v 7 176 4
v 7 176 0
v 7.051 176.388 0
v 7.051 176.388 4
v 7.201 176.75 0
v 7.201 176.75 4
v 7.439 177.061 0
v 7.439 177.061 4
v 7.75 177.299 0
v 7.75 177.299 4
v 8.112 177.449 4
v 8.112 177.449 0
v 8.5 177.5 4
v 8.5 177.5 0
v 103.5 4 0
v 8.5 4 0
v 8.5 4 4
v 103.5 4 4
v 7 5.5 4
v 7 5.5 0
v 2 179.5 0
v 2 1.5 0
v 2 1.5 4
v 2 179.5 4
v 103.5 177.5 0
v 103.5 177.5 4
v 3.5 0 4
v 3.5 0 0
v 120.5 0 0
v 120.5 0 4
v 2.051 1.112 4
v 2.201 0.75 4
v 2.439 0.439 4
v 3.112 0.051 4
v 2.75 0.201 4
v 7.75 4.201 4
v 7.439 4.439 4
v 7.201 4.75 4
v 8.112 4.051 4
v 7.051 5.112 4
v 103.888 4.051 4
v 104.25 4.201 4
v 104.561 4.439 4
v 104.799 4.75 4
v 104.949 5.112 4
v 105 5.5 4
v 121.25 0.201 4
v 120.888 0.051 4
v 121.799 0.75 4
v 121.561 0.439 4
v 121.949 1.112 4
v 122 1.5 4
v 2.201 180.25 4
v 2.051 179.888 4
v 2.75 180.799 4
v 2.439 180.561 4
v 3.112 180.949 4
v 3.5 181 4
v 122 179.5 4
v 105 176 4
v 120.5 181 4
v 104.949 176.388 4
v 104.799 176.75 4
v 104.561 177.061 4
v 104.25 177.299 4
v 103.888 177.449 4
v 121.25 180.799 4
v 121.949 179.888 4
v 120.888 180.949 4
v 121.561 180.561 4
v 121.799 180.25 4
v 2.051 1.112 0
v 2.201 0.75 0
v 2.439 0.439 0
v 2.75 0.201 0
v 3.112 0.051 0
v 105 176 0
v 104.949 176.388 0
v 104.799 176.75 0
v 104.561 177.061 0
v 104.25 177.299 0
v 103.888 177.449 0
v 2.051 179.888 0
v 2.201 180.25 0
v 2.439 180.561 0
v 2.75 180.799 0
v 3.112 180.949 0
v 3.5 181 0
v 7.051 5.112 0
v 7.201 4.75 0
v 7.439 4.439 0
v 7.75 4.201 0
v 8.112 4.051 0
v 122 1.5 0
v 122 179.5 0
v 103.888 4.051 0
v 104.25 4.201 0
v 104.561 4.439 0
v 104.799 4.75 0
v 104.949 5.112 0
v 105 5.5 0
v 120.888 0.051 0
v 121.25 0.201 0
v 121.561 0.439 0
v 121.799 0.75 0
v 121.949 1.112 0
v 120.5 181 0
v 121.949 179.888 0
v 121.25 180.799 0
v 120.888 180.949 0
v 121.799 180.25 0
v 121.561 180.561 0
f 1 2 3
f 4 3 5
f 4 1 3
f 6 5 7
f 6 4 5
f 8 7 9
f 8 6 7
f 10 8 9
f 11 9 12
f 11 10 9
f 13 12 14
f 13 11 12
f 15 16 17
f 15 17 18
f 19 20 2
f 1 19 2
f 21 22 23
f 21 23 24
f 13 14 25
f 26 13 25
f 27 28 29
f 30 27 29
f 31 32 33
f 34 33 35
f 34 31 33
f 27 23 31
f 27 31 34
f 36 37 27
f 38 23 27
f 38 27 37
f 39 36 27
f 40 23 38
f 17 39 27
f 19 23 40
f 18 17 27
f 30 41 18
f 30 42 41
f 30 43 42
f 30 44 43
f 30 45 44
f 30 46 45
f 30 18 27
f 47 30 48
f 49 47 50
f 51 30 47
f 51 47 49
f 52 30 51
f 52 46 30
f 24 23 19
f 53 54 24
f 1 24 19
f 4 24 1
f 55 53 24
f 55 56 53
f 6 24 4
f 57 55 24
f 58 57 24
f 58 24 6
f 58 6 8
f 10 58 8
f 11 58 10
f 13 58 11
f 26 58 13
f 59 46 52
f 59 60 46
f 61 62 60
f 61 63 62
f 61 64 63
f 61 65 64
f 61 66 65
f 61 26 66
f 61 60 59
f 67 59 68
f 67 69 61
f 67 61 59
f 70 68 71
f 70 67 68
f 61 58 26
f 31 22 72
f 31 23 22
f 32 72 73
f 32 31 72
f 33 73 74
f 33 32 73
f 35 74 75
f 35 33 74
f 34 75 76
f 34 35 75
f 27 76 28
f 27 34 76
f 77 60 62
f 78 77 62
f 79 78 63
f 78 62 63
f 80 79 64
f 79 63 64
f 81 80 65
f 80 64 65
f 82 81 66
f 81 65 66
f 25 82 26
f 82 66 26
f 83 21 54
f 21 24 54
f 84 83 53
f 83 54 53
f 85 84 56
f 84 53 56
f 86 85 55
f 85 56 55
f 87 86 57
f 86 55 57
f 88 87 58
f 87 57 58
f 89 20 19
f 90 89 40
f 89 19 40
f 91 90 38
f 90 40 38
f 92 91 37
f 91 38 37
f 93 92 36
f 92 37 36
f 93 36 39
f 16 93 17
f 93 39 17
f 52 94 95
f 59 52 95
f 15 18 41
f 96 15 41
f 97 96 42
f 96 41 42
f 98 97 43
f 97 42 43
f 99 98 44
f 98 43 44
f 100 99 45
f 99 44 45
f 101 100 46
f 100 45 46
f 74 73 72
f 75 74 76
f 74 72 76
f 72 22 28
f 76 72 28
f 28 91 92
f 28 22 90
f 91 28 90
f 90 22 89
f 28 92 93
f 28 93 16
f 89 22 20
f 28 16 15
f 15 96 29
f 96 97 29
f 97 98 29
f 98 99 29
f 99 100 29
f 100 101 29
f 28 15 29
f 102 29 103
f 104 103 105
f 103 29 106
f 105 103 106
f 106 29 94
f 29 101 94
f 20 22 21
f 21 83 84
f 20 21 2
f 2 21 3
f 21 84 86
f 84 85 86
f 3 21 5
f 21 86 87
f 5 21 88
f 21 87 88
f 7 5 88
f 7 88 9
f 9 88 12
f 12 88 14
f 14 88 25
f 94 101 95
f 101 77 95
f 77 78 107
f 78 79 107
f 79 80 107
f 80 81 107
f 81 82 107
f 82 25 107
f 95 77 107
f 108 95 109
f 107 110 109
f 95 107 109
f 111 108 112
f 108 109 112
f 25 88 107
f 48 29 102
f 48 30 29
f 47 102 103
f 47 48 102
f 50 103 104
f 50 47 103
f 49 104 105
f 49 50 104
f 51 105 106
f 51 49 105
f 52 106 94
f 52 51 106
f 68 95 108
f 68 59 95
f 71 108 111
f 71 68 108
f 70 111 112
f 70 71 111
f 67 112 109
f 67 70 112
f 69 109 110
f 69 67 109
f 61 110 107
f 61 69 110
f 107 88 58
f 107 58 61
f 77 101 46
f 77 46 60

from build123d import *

# Parameters (mm, degrees)
BOX001_W     = 98
BOX001_H     = 173.5
BOX001_DEPTH = 10
FILLET_R     = 1.5
BOX_W        = 120
BOX_H        = 181
BOX_DEPTH    = 4
FILLET001_R  = 1.5


with BuildPart() as fillet_body:
    # Box001 → Box001 (new body)
    with BuildSketch(Plane(origin=(7, 4, 0), x_dir=(1, 0, 0), z_dir=(0, 0, 1))):
        with Locations((49, 86.75)):
            Rectangle(BOX001_W, BOX001_H)
    extrude(amount=BOX001_DEPTH)

    # Fillet
    fillet_edges = [fillet_body.edges().sort_by_distance(p)[0] for p in [
        (7, 4, 5),
        (7, 177.5, 5),
        (105, 4, 5),
        (105, 177.5, 5),
    ]]
    fillet(fillet_edges, radius=FILLET_R)


with BuildPart() as cut:
    # Box → Box (new body)
    with BuildSketch(Plane(origin=(2, 0, 0), x_dir=(1, 0, 0), z_dir=(0, 0, 1))):
        with Locations((60, 90.5)):
            Rectangle(BOX_W, BOX_H)
    extrude(amount=BOX_DEPTH)

    # Fillet001
    fillet001_edges = [cut.edges().sort_by_distance(p)[0] for p in [
        (2, 0, 2),
        (2, 181, 2),
        (122, 0, 2),
        (122, 181, 2),
    ]]
    fillet(fillet001_edges, radius=FILLET001_R)

    # Cut: cut Fillet body
    add(fillet_body.part, mode=Mode.SUBTRACT)


solid = cut.part
